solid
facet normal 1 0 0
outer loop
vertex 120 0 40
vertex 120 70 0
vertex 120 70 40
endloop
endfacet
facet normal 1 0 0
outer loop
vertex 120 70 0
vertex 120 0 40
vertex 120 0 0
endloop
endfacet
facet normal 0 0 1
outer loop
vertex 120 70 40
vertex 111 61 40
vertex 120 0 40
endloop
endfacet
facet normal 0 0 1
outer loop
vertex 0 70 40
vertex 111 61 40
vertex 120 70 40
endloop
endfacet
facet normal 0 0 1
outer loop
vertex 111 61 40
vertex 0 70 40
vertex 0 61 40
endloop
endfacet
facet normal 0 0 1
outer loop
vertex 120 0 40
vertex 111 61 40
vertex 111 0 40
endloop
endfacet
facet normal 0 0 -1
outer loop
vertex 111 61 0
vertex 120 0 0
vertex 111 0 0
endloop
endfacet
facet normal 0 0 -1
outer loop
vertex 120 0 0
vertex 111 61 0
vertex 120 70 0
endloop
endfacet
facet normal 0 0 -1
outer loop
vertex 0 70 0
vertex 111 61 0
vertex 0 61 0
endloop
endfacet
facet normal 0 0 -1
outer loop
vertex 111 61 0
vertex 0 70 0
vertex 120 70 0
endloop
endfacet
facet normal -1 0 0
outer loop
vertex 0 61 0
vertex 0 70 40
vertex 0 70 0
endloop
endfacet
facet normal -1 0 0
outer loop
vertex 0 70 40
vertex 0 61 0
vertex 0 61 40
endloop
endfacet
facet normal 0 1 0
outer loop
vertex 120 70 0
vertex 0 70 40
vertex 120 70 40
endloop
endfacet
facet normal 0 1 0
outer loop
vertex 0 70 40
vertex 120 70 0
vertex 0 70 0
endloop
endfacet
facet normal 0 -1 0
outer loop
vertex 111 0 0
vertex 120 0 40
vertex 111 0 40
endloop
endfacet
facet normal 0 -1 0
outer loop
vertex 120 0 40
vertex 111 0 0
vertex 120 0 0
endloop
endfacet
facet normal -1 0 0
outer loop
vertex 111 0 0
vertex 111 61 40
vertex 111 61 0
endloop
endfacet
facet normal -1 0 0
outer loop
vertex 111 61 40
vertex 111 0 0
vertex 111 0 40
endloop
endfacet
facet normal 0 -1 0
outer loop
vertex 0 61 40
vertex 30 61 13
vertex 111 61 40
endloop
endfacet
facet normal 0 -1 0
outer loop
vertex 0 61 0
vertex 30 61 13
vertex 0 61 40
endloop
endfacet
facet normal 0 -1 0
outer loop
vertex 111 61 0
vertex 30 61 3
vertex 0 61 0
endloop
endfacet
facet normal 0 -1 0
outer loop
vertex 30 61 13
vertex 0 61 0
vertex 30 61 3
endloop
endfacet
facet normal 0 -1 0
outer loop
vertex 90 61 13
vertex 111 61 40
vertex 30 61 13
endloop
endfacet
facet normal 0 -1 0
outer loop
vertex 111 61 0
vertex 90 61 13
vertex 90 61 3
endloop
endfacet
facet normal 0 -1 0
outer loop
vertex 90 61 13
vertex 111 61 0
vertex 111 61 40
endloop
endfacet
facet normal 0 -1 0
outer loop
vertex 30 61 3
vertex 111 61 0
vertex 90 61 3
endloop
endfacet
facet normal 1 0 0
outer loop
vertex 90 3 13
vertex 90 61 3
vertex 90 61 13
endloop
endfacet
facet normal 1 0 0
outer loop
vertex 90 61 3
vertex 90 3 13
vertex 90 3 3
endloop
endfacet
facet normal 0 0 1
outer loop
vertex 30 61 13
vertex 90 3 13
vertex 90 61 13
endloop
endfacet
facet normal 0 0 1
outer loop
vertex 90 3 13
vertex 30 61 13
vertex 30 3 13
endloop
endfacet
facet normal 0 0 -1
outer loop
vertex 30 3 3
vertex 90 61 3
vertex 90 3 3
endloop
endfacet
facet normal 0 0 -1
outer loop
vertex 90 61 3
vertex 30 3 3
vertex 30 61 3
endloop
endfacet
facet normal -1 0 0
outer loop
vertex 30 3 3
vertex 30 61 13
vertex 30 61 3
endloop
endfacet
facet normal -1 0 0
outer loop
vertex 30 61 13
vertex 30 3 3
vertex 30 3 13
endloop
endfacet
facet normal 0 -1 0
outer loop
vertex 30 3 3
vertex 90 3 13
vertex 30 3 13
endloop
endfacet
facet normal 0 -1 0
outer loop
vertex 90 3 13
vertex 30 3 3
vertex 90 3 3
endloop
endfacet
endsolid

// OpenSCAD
// Buffer Tank for Mini Horizontal Gel Electrophoresis
// Units: millimetres

// Outer Dimensions
$w_outer = 120; // Width (X)
$d_outer = 70;  // Depth (Y)
$h_outer = 40;  // Height (Z)

// Wall and Floor Thickness
$wall_thick = 3;
$floor_thick = 3;

// Platform Dimensions
$p_len = 60;    // Length (X)
$p_width = $d_outer - (2 * $wall_thick); // Spans full inner width (Y)
$p_height = 10; // Height above inner floor
$p_z_base = $floor_thick + $p_height; // Z position of platform top

// Hole Dimensions
$hole_dia = 2;
$hole_y = 0;
$hole_z = 30;

// Configuration
$fn = 128; // High resolution for smooth curves and accurate hole sizing

// Calculate Inner Dimensions
$w_inner = $w_outer - (2 * $wall_thick);
$d_inner = $d_outer - (2 * $wall_thick);
$h_inner = $h_outer - $floor_thick;

// Main Tank Body
// Constructed as a hollow box with a floor
difference() {
    // Outer Block
    cube([
        $w_outer, 
        $d_outer, 
        $h_outer
    ], center = false);
    
    // Cut out the open top and inner void
    // We subtract a block that is the size of the inner void + top opening
    translate([
        -$wall_thick, 
        -$wall_thick, 
        0
    ]) {
        cube([
            $w_inner, 
            $d_inner, 
            $h_outer
        ], center = false);
    }
}

// Raised Platform
// Located in the middle of the tank, spanning full inner width
translate([
    ($w_outer / 2) - ($p_len / 2), // Center in X
    ($d_outer / 2) - ($p_width / 2), // Center in Y
    $floor_thick // Base on the floor
]) {
    // Platform is a solid block
    cube([
        $p_len, 
        $p_width, 
        $p_height
    ], center = false);
}

// Electrode Holes
// Two holes: one at each end wall (X ends), along the X axis
// Position: y = 0, z = 30
// We use a loop to create the two holes at x = -60 and x = 60 (approx ends)
// Actually, the ends are at x = +/- ($w_outer/2 - $wall_thick/2) relative to center? 
// No, the hole is "Through each end wall". 
// End walls are at X = -60 and X = +60 (outer edges).
// The hole goes through the wall thickness along X.
// Center of hole in X should be at the inner face of the end wall? 
// Or centered in the wall? Usually centered in the wall thickness.
// Wall thickness is 3mm. So center is at X = +/- (60 - 1.5) = +/- 58.5.

$hole_x_pos = [$w_outer/2 - $wall_thick/2, -$w_outer/2 + $wall_thick/2];

difference() {
    // Re-select the main assembly to cut holes
    // Note: In OpenSCAD, difference() applies to the current context. 
    // We need to rebuild the object or use a temporary variable.
    // Since we cannot use variables for complex unions easily in one pass without re-defining,
    // we will reconstruct the base geometry here specifically for the hole operation.
    
    // 1. Outer Block
    cube([
        $w_outer, 
        $d_outer, 
        $h_outer
    ], center = false);
    
    // 2. Inner Void (Open top)
    translate([
        -$wall_thick, 
        -$wall_thick, 
        0
    ]) {
        cube([
            $w_inner, 
            $d_inner, 
            $h_outer
        ], center = false);
    }
    
    // 3. Platform
    translate([
        ($w_outer / 2) - ($p_len / 2), 
        ($d_outer / 2) - ($p_width / 2), 
        $floor_thick
    ]) {
        cube([
            $p_len, 
            $p_width, 
            $p_height
        ], center = false);
    }
    
    // 4. Cut Holes
    for (i = [0 : 1]) {
        $x = $hole_x_pos[i];
        
        // Cylinder for the hole
        // Extend slightly past the wall thickness to ensure clean cut
        translate([
            $x, 
            $hole_y, 
            $hole_z
        ]) {
            cylinder(
                h = $w_outer + 1, // Extend past both ends
                r = $hole_dia / 2,
                $fn = $fn
            );
        }
    }
}
